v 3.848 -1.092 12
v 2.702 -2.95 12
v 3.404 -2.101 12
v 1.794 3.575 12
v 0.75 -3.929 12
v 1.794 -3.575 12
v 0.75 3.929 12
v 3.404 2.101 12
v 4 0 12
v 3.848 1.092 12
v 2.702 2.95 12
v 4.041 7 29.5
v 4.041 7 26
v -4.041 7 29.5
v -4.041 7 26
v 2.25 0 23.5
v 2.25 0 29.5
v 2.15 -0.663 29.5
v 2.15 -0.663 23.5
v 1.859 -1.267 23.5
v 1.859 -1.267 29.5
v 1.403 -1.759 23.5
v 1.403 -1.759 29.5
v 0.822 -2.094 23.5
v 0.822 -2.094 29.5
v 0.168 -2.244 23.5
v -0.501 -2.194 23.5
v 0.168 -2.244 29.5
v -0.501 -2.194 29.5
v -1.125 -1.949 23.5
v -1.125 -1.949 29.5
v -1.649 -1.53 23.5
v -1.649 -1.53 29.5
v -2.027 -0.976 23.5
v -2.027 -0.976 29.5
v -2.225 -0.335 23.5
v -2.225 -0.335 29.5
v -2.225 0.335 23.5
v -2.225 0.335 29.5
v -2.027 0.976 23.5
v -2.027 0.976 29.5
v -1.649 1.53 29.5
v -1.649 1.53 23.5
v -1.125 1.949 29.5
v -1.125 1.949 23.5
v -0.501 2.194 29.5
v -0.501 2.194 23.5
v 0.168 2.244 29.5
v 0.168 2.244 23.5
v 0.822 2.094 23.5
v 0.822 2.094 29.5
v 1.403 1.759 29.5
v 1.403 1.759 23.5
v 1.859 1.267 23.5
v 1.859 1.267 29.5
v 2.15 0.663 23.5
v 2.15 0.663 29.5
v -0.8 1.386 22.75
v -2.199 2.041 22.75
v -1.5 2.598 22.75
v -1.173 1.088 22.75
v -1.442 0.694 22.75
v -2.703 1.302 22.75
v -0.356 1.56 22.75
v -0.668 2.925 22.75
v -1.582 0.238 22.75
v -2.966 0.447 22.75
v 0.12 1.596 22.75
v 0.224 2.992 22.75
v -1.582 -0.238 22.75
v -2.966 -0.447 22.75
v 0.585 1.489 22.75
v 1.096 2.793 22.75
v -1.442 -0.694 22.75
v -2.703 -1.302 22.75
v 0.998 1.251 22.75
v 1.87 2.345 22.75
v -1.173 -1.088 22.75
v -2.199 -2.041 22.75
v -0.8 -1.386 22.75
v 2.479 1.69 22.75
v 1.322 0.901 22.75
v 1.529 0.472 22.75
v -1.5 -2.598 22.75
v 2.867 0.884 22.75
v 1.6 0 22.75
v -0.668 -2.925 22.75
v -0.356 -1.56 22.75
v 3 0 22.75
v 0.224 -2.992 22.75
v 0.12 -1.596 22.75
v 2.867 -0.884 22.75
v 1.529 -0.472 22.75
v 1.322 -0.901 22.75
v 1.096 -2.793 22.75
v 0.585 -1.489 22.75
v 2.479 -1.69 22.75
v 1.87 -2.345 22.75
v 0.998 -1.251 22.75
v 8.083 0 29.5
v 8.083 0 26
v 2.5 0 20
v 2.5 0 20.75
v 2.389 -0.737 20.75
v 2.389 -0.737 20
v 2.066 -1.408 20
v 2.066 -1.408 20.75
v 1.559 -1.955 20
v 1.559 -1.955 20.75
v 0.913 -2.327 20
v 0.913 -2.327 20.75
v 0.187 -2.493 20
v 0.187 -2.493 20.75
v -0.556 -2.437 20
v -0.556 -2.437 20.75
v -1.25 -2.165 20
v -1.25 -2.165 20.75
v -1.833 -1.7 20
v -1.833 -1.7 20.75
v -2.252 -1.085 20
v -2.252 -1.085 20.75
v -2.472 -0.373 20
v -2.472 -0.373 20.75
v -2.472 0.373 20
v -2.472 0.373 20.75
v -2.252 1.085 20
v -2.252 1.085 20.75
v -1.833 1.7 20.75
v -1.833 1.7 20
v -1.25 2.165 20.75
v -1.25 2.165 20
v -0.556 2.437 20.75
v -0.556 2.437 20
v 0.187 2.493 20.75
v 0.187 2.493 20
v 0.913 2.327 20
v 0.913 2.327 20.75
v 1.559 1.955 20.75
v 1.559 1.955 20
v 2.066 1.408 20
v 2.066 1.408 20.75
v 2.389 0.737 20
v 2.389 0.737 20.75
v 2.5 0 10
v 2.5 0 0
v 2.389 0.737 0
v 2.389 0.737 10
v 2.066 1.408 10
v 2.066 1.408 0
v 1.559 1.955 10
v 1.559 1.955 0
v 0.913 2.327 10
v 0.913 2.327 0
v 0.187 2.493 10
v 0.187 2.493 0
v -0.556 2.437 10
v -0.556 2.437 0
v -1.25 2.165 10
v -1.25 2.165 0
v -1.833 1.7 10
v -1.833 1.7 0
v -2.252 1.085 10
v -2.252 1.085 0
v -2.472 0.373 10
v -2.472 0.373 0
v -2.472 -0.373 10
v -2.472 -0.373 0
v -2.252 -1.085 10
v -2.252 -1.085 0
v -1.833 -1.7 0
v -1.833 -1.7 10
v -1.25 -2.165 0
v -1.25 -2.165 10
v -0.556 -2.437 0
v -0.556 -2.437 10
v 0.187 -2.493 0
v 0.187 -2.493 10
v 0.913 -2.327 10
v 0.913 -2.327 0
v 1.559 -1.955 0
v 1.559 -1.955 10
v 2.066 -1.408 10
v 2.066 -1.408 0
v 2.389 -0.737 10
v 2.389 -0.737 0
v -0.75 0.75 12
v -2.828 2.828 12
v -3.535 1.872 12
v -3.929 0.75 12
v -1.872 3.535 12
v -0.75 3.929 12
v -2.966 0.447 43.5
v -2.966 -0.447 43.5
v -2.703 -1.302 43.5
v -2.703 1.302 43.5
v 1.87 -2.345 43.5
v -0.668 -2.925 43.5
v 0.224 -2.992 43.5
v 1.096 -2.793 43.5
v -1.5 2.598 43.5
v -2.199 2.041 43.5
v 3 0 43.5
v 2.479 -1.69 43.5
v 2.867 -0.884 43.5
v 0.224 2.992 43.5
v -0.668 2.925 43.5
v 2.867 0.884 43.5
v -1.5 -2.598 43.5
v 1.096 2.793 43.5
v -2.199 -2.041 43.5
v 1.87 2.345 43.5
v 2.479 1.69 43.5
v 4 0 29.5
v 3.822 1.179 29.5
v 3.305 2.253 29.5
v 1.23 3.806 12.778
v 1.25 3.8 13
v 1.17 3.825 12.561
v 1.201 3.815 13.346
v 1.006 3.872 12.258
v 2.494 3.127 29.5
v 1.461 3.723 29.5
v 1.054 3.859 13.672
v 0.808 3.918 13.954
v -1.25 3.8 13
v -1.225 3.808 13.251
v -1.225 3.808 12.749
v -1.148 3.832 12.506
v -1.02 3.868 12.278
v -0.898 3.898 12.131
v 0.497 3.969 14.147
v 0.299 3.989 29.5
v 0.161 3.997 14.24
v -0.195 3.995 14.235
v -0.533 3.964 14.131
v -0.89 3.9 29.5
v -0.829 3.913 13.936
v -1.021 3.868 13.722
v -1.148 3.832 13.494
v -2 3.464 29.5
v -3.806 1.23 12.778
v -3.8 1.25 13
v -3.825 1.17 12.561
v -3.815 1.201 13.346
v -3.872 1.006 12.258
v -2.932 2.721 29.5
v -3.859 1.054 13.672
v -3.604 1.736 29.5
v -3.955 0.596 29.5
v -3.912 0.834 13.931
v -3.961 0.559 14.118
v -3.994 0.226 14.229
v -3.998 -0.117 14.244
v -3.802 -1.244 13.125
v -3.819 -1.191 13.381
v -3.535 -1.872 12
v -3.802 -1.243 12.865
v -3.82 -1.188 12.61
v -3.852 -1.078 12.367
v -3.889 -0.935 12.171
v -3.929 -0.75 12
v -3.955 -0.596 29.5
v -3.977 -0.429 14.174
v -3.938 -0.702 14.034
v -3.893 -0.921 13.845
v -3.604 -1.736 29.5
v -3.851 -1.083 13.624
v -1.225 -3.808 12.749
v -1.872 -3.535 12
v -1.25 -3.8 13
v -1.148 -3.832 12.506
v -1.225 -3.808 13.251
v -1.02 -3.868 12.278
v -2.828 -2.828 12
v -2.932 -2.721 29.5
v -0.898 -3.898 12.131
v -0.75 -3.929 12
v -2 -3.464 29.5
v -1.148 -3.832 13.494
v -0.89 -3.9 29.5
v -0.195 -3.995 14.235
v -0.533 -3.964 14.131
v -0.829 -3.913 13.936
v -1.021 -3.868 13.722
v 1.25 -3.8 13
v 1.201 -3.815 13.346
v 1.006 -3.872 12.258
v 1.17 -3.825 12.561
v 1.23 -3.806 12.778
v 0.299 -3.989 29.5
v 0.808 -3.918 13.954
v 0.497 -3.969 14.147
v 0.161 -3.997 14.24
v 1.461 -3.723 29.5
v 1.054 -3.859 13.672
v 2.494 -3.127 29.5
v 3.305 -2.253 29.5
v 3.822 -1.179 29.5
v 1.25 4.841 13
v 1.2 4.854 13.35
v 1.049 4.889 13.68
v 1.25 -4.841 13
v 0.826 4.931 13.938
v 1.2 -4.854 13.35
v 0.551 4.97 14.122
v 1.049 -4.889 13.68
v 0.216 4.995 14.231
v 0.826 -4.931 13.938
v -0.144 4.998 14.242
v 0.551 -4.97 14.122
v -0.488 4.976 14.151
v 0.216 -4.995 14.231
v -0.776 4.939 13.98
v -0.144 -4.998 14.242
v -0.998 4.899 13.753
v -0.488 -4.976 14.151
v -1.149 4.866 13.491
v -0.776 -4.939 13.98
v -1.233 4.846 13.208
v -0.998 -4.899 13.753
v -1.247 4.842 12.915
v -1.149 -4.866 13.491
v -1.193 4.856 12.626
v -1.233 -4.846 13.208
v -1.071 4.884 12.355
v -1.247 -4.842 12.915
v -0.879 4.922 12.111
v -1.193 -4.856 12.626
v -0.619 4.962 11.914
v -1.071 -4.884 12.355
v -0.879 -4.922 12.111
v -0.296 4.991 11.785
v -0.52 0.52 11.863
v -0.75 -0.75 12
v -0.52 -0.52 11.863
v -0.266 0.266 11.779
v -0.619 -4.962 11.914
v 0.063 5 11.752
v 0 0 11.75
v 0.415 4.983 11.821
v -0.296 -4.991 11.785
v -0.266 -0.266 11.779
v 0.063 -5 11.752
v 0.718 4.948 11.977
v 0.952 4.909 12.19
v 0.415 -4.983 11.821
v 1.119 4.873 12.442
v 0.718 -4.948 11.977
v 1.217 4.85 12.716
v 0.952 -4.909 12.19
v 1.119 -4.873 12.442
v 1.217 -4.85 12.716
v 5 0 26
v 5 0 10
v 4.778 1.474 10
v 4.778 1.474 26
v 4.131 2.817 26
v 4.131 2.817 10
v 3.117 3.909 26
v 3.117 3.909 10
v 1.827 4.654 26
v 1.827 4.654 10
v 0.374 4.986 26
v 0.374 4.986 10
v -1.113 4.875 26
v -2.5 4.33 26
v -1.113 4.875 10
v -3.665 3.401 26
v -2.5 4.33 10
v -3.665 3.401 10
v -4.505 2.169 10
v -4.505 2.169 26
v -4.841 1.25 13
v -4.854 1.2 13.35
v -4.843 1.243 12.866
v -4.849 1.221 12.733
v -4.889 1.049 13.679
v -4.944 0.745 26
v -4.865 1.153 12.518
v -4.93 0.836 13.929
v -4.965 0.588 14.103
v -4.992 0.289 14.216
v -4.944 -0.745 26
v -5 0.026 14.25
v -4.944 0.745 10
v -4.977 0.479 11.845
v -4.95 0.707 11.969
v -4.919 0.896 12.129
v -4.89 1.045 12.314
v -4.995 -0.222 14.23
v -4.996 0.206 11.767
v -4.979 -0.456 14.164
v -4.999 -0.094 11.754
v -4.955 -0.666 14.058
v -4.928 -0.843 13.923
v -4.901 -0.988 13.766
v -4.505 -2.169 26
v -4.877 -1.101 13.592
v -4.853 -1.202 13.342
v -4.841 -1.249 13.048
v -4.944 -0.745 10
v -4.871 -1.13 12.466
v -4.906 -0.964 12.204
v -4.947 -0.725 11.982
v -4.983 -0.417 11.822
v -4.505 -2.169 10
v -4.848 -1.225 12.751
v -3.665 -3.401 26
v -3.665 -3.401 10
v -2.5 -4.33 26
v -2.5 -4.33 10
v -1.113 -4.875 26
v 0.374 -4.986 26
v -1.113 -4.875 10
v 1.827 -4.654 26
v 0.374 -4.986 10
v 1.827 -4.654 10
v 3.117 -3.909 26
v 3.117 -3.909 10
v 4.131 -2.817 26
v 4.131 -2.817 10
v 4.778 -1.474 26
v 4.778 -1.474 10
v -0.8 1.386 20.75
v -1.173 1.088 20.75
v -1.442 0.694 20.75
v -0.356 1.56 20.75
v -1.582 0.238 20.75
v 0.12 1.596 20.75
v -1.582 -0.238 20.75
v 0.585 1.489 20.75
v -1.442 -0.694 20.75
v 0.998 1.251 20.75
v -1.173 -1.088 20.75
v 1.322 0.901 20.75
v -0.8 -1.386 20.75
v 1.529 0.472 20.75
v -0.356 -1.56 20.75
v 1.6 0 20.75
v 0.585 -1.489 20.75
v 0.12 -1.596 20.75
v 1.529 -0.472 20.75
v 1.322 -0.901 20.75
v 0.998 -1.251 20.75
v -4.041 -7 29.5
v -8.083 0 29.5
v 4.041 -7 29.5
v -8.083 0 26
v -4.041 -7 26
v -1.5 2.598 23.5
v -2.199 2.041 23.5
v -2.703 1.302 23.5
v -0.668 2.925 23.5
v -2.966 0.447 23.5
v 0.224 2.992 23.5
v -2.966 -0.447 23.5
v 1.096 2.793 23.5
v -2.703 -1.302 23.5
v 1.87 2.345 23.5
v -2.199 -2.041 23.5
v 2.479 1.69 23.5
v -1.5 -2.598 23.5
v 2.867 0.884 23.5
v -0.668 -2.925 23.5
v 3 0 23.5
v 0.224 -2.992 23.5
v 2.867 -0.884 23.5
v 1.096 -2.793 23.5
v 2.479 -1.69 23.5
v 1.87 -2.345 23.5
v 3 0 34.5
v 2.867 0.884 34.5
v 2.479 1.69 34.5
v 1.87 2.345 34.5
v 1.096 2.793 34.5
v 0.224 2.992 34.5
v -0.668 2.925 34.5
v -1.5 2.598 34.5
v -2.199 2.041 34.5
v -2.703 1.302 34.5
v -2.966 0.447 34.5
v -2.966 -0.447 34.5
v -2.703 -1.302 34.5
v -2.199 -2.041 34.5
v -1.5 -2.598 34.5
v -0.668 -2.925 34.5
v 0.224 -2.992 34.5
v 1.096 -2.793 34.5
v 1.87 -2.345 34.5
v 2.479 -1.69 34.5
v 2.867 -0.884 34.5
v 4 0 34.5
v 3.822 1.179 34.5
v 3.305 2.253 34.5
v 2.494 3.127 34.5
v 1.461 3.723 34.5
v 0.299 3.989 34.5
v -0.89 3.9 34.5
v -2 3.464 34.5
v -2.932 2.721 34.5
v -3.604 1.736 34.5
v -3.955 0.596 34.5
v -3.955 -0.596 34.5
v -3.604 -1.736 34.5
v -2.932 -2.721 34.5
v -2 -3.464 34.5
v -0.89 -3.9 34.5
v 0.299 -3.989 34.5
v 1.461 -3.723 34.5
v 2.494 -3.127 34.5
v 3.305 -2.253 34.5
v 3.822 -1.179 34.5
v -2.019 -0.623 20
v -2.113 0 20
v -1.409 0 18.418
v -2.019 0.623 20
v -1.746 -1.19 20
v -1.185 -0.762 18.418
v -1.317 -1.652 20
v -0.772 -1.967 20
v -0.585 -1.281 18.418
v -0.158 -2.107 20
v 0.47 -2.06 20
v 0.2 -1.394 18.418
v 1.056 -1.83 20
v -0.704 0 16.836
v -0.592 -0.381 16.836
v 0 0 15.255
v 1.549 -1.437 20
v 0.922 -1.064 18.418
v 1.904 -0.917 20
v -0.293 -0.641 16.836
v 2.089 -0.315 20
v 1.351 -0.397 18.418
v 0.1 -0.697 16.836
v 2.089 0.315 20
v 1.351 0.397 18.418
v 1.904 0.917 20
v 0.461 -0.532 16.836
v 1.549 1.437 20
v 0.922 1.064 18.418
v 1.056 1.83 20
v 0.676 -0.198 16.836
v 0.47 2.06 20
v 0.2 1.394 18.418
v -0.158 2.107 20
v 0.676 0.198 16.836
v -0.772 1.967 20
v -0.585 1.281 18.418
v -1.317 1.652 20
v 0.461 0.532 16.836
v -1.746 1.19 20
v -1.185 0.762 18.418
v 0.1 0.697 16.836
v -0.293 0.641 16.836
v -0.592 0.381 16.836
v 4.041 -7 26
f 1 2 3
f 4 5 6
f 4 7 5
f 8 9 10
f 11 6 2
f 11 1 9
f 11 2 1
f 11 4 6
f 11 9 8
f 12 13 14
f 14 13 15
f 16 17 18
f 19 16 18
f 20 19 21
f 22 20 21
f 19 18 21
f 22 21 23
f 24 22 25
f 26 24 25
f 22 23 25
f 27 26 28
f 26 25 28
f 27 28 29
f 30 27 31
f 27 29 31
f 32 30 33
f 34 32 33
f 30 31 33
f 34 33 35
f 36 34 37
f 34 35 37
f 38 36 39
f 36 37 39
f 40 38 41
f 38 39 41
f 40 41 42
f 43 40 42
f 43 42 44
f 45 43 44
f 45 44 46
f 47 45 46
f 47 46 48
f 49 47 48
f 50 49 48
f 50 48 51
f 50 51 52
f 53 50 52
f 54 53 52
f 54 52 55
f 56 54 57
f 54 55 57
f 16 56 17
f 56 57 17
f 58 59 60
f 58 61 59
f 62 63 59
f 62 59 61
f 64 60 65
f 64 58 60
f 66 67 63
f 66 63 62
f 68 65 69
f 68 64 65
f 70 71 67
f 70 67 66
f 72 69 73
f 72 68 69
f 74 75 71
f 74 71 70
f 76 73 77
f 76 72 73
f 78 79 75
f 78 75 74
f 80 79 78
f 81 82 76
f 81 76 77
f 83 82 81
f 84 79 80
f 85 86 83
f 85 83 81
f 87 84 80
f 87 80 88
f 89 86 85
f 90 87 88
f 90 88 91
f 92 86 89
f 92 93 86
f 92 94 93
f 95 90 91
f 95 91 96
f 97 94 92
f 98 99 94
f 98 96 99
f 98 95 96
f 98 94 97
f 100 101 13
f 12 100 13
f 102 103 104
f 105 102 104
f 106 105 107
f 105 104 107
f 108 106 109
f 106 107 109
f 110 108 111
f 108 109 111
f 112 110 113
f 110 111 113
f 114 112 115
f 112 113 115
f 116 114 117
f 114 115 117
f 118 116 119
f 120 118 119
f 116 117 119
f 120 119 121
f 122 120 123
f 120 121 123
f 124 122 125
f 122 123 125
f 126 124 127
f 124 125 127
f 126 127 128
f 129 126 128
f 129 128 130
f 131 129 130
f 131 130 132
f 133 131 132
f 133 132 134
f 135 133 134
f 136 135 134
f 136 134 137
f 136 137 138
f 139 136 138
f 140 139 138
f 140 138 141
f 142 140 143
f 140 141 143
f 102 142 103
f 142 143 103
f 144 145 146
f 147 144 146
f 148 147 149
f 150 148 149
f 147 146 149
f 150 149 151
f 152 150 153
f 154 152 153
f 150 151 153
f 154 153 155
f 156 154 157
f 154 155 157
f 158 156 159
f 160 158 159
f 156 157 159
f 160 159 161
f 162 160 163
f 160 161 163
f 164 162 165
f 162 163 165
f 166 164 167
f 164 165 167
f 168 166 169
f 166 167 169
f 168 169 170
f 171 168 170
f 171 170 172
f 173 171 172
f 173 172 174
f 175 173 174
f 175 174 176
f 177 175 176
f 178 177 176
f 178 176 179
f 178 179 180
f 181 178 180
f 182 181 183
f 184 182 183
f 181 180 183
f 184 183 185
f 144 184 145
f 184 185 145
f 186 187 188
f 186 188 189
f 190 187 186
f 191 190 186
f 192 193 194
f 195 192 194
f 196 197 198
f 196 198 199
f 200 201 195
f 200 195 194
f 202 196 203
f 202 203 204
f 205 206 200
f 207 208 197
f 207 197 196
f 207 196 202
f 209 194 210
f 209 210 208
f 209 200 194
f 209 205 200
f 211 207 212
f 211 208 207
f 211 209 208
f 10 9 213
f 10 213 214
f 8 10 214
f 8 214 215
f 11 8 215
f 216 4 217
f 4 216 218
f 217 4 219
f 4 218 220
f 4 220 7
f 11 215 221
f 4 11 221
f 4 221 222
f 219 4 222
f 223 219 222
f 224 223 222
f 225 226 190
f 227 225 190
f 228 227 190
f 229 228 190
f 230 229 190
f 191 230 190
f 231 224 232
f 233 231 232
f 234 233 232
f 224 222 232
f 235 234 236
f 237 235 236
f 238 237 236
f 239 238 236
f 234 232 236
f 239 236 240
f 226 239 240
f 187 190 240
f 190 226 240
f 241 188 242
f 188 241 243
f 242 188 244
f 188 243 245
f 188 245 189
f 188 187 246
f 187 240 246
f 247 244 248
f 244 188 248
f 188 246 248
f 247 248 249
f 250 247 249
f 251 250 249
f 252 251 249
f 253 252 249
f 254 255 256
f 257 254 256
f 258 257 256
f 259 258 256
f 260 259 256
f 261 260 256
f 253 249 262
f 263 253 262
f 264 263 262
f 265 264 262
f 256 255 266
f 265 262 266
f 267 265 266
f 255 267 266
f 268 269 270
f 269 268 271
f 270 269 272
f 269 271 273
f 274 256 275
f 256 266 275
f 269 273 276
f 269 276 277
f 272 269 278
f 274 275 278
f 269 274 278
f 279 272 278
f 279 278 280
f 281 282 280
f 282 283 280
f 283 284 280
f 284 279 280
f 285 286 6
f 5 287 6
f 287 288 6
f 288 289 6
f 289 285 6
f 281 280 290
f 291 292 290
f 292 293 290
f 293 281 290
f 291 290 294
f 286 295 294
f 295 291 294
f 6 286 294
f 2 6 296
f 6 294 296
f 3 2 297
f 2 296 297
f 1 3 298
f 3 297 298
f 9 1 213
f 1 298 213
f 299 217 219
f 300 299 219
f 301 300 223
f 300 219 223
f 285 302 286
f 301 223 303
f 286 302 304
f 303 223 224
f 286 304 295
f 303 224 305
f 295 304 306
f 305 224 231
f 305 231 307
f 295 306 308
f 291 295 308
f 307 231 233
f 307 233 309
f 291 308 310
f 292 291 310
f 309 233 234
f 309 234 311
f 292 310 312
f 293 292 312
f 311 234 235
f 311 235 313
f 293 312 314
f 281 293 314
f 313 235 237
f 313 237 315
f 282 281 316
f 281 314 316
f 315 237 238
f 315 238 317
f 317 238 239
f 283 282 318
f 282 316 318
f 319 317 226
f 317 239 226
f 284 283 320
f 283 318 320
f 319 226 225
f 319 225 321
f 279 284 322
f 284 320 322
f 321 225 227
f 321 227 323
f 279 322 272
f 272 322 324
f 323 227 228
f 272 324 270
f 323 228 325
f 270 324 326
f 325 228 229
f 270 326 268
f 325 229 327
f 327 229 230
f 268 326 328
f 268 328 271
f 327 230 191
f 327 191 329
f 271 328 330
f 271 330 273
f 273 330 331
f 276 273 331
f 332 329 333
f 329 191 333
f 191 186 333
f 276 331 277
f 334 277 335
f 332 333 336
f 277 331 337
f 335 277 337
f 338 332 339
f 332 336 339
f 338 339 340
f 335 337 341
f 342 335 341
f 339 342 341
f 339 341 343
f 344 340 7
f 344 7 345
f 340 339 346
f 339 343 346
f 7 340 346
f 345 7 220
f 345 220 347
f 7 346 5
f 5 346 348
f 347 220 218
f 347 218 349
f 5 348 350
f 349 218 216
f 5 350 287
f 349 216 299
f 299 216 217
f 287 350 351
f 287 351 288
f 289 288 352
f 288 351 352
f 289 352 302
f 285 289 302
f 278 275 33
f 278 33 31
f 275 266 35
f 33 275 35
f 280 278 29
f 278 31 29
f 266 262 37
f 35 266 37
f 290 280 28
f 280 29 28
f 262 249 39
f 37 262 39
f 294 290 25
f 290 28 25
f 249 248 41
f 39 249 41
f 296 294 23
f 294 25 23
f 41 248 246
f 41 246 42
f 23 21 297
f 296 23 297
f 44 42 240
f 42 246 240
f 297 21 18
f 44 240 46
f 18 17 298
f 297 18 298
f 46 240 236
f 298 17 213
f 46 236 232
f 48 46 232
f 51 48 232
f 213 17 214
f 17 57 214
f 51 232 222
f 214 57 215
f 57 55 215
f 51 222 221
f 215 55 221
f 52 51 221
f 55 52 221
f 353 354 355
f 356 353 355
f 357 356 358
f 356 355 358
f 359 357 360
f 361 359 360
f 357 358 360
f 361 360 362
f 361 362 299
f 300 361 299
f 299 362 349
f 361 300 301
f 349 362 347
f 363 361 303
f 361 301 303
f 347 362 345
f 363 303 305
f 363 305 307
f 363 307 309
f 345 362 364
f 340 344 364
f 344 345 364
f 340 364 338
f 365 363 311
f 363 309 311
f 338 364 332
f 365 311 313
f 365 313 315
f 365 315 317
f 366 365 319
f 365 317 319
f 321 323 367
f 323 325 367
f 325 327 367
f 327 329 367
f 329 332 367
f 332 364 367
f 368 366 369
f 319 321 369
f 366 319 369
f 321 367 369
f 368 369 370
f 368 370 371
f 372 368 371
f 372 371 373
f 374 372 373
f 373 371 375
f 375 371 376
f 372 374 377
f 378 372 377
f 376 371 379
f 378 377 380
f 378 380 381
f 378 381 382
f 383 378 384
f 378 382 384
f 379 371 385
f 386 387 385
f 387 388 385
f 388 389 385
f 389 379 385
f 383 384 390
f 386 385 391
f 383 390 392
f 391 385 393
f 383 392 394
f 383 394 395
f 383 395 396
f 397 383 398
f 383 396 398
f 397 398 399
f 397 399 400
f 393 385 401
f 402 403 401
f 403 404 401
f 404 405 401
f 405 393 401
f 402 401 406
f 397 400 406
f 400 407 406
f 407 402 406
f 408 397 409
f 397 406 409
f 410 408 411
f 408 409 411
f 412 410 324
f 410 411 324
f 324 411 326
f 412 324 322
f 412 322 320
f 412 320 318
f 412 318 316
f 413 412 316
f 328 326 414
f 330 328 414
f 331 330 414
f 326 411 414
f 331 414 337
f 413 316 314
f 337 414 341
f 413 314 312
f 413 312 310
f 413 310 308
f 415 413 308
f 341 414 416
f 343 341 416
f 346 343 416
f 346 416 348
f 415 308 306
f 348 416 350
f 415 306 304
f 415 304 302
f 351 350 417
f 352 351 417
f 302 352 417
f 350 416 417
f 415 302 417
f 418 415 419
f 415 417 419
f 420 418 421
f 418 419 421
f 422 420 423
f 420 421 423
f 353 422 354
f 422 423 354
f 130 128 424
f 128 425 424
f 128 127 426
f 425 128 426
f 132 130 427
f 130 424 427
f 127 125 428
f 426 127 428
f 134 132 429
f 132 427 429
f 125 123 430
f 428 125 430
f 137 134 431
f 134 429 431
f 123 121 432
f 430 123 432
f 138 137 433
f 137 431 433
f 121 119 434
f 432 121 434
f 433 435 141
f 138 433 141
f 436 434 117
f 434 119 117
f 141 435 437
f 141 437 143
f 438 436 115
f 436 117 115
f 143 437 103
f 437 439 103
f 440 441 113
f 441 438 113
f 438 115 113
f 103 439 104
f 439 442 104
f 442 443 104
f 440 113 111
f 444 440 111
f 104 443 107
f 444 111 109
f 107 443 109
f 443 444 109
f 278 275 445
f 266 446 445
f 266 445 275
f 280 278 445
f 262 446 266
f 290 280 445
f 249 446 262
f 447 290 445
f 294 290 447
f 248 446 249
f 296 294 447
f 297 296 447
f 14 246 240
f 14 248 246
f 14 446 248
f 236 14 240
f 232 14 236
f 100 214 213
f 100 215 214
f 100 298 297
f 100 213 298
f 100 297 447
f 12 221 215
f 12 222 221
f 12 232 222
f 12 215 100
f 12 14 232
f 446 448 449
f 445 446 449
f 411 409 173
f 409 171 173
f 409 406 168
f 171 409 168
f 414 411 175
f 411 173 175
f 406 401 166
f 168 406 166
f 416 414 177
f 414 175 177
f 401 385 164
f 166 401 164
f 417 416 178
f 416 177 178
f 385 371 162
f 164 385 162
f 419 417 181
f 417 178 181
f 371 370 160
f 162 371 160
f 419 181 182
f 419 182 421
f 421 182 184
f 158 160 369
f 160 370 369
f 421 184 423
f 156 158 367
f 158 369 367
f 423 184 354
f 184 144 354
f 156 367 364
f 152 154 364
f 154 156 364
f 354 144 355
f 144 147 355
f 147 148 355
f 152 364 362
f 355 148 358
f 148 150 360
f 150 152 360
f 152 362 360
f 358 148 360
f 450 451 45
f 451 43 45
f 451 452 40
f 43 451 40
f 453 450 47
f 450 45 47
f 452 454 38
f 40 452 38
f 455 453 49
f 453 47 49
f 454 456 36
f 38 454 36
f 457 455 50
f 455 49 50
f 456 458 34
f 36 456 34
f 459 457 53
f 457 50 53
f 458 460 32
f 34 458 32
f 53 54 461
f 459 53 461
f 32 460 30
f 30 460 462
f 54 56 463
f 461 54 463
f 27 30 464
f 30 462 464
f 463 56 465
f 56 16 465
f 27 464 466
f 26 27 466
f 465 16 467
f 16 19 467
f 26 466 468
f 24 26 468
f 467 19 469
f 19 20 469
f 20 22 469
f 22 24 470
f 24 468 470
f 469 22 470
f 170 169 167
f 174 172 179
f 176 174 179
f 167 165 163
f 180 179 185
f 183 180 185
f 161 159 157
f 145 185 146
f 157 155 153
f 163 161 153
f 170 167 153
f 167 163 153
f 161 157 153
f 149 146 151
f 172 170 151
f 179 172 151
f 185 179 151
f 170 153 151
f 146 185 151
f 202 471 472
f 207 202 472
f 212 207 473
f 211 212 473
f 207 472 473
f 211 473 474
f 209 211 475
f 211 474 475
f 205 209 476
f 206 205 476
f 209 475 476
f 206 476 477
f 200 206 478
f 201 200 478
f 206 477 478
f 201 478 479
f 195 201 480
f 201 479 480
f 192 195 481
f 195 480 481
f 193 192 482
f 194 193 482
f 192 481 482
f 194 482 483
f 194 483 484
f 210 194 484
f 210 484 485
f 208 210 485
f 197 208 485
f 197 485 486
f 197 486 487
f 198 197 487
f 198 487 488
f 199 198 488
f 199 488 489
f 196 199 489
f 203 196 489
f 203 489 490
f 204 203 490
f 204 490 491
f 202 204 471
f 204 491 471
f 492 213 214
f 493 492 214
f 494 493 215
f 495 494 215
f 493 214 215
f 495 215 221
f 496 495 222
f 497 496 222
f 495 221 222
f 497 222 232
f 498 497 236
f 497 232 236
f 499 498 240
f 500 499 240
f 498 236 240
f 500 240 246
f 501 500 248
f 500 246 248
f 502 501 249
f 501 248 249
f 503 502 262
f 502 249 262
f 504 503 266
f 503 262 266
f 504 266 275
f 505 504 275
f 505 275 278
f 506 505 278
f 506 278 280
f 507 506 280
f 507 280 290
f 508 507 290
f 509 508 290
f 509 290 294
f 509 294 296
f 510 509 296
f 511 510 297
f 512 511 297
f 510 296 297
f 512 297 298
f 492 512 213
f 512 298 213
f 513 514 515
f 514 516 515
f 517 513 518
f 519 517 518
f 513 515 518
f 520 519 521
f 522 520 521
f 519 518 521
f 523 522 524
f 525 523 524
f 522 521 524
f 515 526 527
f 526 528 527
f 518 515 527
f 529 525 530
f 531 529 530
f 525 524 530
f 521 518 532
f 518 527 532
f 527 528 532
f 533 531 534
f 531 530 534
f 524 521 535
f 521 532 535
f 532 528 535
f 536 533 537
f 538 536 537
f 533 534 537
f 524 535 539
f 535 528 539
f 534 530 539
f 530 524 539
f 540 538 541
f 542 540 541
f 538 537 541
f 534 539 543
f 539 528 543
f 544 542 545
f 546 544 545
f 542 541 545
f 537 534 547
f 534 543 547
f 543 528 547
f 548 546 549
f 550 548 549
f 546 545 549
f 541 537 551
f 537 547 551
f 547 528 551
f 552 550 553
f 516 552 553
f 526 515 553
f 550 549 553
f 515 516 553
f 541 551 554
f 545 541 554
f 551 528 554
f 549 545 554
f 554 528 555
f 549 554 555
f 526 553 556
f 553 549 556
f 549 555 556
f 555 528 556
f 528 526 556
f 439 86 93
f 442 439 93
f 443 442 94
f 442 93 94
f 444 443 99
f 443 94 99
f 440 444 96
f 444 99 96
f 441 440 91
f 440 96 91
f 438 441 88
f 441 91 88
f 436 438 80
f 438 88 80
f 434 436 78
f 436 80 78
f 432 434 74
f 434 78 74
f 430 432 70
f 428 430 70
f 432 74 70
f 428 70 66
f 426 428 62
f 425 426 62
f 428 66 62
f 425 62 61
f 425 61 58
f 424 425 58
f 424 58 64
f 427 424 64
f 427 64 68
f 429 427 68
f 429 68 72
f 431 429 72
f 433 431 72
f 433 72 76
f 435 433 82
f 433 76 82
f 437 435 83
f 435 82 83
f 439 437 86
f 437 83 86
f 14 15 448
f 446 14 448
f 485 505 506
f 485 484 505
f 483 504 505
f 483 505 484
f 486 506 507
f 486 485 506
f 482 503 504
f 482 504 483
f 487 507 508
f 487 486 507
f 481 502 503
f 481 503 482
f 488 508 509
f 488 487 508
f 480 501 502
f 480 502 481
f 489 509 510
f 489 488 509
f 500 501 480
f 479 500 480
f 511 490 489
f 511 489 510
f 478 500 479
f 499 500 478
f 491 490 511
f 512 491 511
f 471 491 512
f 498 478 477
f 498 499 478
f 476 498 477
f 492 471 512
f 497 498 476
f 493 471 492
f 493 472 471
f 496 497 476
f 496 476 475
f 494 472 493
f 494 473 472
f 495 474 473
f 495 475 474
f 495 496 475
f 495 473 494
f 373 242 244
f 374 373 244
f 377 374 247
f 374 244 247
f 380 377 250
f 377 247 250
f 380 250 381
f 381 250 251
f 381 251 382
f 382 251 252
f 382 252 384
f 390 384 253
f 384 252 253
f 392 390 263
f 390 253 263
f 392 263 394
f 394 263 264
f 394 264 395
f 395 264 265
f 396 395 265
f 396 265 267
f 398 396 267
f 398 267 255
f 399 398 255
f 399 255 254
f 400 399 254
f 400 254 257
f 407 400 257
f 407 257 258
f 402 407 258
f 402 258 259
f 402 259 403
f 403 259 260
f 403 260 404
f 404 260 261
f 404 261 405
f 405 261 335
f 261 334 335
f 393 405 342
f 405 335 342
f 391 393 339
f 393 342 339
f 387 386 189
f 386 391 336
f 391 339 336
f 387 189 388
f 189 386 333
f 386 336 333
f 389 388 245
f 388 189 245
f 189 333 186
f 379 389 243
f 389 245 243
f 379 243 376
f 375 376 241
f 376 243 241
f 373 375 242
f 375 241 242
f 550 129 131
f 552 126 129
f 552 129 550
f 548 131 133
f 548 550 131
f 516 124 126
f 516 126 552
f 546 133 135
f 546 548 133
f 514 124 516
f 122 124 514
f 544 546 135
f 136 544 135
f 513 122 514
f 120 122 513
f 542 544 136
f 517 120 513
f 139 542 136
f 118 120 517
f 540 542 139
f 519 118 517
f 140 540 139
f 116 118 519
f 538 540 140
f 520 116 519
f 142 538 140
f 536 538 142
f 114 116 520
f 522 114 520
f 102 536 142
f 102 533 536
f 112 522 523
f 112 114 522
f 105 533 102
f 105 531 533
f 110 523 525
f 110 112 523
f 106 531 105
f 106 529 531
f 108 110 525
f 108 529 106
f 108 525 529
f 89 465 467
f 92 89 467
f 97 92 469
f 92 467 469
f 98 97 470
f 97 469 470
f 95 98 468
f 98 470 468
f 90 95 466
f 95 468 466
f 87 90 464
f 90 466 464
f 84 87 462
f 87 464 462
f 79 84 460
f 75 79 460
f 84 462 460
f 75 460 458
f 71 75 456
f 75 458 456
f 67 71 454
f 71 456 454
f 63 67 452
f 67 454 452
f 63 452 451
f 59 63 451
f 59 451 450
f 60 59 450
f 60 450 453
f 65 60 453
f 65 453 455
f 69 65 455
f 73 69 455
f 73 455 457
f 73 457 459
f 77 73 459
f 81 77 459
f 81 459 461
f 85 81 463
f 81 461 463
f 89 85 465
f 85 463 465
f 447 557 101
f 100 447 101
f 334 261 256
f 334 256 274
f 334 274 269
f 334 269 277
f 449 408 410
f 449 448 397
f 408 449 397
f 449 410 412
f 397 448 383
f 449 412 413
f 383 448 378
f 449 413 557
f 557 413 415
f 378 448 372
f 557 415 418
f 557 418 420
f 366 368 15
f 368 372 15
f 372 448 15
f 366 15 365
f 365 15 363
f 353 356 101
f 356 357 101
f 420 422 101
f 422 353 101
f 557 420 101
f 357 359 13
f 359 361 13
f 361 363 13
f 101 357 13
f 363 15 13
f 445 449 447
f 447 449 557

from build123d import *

# Parameters (mm, degrees)
F0_R      = 2.5
F1_DEPTH  = 10
F2_R      = 5
F3_DEPTH  = 16
F5_DEPTH  = 3.5
F6_R      = 4
F7_DEPTH  = 17.5
F8_R      = 1.25
F9_DEPTH  = 12.5
F10_R     = 1.25
F11_DEPTH = 8.083904
F12_R     = 4
F13_DEPTH = 5
F14_R     = 3
F15_DEPTH = 9
F16_R     = 2.25
F17_DEPTH = 6
F18_R     = 3
F19_DEPTH = 0.75
F20_R     = 1.6
F21_DEPTH = 2
F22_R     = 2.5
F23_DEPTH = 0.75


with BuildPart() as f1:
    # F0 (on Top) → F1 (new body)
    with BuildSketch(Plane.XY):
        Circle(F0_R)
    extrude(amount=F1_DEPTH)

    # F2 (on face) → F3 (join)
    with BuildSketch(Plane.XY.offset(10)):
        Circle(F2_R)
    extrude(amount=F3_DEPTH)

    # F4 (on face) → F5 (join)
    with BuildSketch(Plane.XY.offset(26)):
        Polygon((4.041452, 7), (-4.041452, 7), (-8.082904, 0), (-4.041452, -7), (4.041452, -7), (8.082904, 0), align=None)
    extrude(amount=F5_DEPTH)

    # F6 (on face) → F7 (cut)
    with BuildSketch(Plane.XY.offset(29.5)):
        Circle(F6_R)
    extrude(amount=-F7_DEPTH, mode=Mode.SUBTRACT)

    # F8 (on Front) → F9 (cut, symmetric)
    with BuildSketch(Plane.XZ):
        with Locations((0, 13)):
            Circle(F8_R)
    extrude(amount=F9_DEPTH, both=True, mode=Mode.SUBTRACT)

    # F10 (on Right) → F11 (cut, through all)
    with BuildSketch(Plane.YZ):
        with Locations((0, 13)):
            Circle(F10_R)
    extrude(amount=-F11_DEPTH, mode=Mode.SUBTRACT)


with BuildPart() as f13:
    # F12 (on face) → F13 (new body)
    with BuildSketch(Plane.XY.offset(29.5)):
        Circle(F12_R)
    extrude(amount=F13_DEPTH)

    # F14 (on face) → F15 (join)
    with BuildSketch(Plane.XY.offset(34.5)):
        Circle(F14_R)
    extrude(amount=F15_DEPTH)

    # F16 (on face) → F17 (join)
    with BuildSketch(Plane(origin=(0, 0, 29.5), x_dir=(1, 0, 0), z_dir=(0, 0, -1))):
        Circle(F16_R)
    extrude(amount=F17_DEPTH)

    # F18 (on face) → F19 (join)
    with BuildSketch(Plane(origin=(0, 0, 23.5), x_dir=(1, 0, 0), z_dir=(0, 0, -1))):
        Circle(F18_R)
    extrude(amount=F19_DEPTH)

    # F20 (on face) → F21 (join)
    with BuildSketch(Plane(origin=(0, 0, 22.75), x_dir=(1, 0, 0), z_dir=(0, 0, -1))):
        Circle(F20_R)
    extrude(amount=F21_DEPTH)

    # F22 (on face) → F23 (join)
    with BuildSketch(Plane(origin=(0, 0, 20.75), x_dir=(1, 0, 0), z_dir=(0, 0, -1))):
        Circle(F22_R)
    extrude(amount=F23_DEPTH)

    # F24 (on Front) → F25 (revolve)
    with BuildSketch(Plane.XZ):
        Polygon((0, 15.254581), (0, 20), (-2.112797, 20), align=None)
    revolve(axis=Axis((0, 0, 17.627291), (0, 0, 1)))


solid = Compound([f1.part, f13.part])
